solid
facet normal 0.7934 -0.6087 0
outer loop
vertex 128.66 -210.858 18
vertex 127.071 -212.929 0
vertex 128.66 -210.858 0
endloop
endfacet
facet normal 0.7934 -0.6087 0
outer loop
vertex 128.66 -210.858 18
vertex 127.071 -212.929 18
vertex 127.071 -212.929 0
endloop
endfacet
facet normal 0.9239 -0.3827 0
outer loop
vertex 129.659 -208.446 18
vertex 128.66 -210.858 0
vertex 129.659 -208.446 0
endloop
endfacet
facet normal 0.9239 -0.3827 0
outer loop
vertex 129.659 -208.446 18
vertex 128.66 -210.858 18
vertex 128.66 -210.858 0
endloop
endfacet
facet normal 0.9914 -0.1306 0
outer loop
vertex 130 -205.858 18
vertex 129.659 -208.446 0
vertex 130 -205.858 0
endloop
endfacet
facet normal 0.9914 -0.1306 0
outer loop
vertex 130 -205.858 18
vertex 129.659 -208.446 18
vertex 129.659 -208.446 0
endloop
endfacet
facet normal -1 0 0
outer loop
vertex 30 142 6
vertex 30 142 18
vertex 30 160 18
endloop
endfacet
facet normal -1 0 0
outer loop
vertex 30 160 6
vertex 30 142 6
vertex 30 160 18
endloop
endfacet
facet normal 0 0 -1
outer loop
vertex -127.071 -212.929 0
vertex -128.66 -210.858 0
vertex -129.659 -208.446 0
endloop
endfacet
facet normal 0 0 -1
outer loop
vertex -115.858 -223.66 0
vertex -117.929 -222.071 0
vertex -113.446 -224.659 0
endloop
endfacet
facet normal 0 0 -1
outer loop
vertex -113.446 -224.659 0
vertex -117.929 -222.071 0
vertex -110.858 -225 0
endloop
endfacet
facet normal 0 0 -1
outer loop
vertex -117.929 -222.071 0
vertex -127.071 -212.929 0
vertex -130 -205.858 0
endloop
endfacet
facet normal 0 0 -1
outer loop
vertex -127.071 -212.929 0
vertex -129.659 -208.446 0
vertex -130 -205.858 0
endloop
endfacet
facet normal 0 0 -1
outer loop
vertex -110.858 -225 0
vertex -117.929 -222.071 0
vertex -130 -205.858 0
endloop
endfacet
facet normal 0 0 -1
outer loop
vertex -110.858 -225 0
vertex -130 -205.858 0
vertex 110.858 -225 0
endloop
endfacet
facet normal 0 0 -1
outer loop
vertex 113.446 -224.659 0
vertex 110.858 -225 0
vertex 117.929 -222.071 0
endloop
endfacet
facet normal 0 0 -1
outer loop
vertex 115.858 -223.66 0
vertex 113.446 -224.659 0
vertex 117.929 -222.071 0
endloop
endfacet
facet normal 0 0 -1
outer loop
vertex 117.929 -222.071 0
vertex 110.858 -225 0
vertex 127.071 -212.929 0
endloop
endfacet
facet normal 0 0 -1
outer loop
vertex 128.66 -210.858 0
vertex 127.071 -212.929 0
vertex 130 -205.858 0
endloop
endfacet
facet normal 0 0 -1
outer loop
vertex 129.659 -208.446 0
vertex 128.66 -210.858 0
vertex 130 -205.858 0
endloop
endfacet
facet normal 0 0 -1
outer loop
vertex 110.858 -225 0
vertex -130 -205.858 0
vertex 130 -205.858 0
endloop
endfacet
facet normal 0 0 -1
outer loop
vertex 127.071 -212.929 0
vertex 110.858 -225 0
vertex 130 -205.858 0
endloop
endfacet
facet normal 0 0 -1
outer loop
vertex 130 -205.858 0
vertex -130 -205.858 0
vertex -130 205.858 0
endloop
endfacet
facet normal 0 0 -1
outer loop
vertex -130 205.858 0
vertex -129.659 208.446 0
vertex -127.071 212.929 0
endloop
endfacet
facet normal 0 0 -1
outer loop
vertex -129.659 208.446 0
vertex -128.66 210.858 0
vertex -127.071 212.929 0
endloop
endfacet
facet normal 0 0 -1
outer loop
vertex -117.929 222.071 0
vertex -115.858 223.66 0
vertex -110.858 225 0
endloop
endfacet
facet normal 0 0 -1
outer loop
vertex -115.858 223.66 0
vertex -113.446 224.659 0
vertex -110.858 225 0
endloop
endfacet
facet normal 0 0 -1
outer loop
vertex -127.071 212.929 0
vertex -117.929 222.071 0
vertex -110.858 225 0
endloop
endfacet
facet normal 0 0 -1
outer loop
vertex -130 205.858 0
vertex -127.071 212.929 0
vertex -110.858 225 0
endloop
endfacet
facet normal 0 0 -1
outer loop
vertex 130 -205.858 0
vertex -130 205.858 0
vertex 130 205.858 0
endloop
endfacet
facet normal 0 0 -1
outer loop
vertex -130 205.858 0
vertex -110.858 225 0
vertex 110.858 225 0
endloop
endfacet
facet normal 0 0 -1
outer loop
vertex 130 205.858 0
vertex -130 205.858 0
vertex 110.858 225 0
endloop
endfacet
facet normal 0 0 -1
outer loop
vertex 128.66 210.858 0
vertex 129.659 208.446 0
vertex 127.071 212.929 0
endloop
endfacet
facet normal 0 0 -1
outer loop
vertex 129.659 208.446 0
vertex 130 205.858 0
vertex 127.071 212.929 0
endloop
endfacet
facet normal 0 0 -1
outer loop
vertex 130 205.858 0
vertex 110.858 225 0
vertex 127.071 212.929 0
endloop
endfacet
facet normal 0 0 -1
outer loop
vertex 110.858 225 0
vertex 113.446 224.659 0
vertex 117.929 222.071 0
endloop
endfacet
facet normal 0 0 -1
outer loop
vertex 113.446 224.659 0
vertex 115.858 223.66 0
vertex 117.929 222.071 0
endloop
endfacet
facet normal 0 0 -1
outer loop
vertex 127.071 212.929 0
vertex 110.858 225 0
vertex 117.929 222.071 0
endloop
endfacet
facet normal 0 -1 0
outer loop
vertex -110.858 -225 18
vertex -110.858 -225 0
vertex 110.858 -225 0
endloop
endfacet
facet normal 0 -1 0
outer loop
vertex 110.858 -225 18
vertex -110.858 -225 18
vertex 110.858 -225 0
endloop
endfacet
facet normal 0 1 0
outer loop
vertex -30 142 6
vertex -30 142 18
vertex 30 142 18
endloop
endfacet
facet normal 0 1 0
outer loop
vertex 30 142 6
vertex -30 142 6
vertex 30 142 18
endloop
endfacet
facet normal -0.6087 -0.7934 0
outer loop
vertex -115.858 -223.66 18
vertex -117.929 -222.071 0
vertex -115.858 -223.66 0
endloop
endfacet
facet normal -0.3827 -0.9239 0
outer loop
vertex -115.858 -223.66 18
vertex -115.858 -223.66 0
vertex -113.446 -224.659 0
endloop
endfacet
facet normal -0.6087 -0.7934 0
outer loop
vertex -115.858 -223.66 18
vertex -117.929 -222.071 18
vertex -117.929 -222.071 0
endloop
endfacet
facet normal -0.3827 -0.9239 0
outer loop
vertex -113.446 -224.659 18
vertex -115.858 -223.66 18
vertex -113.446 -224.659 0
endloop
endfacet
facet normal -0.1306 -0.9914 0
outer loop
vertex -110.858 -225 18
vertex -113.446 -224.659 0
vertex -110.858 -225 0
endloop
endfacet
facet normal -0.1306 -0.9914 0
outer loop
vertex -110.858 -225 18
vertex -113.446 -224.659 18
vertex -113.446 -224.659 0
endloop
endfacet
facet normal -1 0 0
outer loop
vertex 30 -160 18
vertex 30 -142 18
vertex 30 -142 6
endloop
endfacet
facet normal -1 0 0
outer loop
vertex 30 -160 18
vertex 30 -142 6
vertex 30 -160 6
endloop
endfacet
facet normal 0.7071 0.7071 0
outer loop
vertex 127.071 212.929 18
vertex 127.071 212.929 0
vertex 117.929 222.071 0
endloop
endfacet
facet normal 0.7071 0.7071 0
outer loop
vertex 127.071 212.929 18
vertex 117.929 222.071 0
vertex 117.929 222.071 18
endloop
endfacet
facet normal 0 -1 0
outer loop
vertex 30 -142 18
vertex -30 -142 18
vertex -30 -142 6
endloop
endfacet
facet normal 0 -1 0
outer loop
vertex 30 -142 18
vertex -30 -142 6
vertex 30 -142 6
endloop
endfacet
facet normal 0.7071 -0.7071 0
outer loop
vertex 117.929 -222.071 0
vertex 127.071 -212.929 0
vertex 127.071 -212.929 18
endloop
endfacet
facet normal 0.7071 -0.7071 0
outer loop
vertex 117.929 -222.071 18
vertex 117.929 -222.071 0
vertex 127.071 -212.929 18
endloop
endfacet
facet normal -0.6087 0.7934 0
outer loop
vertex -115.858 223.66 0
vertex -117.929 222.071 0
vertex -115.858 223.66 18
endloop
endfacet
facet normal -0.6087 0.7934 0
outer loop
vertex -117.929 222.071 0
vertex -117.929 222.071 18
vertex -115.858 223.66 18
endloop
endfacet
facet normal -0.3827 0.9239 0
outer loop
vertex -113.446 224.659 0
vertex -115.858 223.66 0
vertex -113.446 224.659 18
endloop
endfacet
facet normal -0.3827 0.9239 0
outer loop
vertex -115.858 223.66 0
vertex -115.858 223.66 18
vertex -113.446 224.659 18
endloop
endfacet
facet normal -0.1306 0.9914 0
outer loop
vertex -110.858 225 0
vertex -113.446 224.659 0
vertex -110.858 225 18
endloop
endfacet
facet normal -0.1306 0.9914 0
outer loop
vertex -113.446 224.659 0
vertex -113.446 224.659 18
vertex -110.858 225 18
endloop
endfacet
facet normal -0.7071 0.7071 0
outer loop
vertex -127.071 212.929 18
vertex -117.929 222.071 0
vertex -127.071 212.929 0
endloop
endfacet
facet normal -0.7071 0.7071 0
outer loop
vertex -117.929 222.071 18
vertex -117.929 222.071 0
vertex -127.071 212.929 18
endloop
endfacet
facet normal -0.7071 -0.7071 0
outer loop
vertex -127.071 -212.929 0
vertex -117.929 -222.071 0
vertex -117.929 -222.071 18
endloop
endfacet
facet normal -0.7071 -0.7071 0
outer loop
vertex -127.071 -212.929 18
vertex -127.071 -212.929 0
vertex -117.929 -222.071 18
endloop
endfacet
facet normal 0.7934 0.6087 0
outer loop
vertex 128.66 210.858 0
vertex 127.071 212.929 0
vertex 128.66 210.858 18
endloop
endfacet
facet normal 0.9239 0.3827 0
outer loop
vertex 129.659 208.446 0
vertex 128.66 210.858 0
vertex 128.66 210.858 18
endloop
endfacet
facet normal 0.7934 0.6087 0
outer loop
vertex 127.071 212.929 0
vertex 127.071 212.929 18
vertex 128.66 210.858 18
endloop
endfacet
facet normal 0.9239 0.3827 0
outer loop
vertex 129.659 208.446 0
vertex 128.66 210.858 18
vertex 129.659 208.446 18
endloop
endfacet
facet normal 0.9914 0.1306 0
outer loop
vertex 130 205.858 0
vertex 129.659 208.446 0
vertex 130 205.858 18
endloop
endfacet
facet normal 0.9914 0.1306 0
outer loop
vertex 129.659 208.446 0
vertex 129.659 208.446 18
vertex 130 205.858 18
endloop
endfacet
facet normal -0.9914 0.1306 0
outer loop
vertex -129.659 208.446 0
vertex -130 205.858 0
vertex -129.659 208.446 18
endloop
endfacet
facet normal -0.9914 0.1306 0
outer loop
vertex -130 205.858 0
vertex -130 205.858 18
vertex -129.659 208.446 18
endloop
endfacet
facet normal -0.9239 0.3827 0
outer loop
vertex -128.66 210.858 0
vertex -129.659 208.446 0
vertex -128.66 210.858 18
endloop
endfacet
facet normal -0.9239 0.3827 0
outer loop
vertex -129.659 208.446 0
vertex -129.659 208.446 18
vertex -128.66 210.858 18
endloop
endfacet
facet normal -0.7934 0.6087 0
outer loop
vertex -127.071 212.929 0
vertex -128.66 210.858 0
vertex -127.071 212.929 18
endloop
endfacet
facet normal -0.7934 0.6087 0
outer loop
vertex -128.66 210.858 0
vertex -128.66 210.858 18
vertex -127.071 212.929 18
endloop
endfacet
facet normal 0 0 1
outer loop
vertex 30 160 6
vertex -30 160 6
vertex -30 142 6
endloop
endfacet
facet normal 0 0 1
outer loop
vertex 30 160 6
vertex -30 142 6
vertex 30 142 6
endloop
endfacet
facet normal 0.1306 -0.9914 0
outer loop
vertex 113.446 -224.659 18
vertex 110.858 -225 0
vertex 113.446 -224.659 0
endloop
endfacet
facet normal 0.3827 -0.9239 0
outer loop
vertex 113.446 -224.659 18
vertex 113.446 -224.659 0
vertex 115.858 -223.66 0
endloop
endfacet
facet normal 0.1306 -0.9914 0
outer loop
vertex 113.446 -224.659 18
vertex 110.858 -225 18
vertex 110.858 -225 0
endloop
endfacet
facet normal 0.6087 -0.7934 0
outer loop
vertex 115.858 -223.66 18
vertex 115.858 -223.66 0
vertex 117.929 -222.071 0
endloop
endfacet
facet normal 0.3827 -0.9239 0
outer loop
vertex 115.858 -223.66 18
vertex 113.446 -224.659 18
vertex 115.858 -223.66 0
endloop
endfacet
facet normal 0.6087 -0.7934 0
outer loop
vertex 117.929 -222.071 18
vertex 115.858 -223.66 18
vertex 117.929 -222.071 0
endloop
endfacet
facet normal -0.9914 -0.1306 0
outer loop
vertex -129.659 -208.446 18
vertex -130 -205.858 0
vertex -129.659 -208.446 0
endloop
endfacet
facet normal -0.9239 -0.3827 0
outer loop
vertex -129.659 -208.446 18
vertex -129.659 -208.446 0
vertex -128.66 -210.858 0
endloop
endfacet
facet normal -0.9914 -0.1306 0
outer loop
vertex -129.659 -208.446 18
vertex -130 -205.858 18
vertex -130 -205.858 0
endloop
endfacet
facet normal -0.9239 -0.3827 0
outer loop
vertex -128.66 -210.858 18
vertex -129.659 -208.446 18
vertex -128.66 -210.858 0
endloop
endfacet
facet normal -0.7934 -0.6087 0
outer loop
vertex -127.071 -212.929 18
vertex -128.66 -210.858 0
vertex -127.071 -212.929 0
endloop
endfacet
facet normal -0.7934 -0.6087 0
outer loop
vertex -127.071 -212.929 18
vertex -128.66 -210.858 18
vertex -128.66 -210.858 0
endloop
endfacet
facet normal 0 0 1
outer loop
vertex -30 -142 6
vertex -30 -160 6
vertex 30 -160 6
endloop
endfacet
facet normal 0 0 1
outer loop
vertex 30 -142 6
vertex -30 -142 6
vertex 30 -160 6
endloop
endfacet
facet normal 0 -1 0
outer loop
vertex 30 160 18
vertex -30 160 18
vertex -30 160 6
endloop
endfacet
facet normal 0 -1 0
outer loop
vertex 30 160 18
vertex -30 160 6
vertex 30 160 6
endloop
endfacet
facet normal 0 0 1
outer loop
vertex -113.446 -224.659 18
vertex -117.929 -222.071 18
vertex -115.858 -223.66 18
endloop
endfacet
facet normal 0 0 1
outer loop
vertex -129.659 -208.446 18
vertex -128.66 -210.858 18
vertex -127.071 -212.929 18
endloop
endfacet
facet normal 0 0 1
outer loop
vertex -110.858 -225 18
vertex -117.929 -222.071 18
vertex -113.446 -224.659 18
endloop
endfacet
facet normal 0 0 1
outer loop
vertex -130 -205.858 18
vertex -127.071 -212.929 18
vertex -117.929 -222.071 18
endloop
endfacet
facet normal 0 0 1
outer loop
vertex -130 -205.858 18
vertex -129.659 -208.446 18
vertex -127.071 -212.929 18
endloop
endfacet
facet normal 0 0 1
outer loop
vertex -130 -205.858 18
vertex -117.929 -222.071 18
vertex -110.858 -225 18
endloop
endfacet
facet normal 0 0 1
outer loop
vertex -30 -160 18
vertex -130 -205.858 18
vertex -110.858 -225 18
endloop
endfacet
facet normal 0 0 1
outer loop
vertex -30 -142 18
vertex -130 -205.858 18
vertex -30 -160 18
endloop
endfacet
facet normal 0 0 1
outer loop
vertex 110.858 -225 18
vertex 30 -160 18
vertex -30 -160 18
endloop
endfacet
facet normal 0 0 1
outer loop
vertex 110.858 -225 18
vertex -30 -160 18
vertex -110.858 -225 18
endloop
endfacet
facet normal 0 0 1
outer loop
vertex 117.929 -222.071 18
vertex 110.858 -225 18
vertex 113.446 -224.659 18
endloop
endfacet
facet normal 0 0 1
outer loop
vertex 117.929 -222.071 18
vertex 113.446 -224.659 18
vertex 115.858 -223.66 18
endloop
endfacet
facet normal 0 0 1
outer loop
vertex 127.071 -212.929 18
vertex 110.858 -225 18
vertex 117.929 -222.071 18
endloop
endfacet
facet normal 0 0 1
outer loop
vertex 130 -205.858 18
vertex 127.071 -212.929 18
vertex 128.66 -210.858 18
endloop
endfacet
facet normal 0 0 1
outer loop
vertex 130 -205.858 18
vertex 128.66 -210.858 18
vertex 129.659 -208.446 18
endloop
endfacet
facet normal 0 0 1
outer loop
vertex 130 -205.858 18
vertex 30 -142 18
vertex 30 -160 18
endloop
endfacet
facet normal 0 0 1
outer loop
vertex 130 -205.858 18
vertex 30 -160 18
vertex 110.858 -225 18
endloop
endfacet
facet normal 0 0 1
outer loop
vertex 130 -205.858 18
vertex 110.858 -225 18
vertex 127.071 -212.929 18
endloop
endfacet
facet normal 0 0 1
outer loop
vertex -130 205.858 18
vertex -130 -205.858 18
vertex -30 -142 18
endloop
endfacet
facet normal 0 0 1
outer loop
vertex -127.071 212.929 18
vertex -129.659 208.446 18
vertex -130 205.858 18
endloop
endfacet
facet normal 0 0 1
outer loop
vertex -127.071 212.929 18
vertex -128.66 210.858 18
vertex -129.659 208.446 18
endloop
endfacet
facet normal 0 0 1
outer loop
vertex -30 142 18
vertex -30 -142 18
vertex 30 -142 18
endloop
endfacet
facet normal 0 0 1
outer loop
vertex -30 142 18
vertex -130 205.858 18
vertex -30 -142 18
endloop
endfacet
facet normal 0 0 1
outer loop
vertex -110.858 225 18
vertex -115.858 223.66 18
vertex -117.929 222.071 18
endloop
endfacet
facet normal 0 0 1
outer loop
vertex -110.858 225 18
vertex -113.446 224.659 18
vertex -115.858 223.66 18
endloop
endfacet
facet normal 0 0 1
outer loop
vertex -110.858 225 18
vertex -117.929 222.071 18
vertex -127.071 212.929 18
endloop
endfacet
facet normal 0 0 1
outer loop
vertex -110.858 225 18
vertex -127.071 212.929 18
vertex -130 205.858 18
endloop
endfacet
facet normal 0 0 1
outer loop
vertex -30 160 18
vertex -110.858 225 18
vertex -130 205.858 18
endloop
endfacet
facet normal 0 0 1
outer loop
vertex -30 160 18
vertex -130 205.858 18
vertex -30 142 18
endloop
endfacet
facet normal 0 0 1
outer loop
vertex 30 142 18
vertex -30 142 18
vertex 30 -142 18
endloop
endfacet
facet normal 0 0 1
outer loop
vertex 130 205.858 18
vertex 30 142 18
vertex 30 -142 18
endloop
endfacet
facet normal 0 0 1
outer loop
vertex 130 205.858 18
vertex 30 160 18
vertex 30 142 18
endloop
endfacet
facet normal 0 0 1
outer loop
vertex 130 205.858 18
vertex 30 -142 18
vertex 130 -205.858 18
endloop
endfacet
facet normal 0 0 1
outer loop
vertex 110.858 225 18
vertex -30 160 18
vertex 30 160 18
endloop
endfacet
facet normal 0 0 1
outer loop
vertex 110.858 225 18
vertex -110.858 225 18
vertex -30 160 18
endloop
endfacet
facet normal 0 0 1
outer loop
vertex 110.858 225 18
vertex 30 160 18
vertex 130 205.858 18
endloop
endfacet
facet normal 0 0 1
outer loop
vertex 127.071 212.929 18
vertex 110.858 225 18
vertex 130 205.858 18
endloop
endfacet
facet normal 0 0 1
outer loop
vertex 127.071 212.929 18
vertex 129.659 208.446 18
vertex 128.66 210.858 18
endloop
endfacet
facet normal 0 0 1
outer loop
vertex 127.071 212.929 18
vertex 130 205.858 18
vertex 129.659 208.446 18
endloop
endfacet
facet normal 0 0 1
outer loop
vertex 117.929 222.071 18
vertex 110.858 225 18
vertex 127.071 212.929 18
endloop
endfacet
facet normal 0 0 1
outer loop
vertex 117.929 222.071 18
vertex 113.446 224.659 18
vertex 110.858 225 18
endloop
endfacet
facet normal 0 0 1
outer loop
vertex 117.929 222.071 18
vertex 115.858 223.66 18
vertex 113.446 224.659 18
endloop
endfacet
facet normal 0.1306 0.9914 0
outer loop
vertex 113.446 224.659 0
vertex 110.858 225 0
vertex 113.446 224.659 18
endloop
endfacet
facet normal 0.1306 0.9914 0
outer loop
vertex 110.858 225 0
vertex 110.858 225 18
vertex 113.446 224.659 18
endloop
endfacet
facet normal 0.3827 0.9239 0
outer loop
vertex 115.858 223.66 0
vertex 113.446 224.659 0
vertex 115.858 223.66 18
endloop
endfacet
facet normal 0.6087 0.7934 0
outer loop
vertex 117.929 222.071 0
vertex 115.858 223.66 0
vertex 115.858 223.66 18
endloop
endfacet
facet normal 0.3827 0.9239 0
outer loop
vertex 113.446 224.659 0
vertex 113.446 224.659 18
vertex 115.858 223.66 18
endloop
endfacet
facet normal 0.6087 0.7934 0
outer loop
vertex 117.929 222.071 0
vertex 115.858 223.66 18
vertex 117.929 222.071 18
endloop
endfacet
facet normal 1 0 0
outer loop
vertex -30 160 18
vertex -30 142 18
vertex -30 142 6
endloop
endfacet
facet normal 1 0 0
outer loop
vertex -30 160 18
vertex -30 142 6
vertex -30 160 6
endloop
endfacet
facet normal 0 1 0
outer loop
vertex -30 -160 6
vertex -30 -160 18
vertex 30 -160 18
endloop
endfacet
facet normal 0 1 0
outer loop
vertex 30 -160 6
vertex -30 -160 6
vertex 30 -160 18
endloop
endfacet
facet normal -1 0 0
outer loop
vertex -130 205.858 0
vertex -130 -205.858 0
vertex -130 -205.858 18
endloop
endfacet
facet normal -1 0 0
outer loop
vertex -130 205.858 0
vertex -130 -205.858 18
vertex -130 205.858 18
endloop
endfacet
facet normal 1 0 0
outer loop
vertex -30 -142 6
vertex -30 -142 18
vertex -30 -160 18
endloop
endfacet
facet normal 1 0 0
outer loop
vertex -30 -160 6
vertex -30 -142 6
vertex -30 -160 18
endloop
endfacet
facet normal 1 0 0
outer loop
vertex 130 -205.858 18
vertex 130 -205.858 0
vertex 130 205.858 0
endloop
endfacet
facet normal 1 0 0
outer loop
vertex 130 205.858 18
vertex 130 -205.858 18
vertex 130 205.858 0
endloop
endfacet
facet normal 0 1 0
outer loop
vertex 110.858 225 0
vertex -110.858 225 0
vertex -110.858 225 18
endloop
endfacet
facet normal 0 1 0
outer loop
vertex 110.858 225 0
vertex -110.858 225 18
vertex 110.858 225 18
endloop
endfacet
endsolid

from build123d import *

# Parameters (mm, degrees)
SKETCH_W     = 260
SKETCH_H     = 450
PAD_DEPTH    = 18
SKETCH001_W  = 60
SKETCH001_H  = 18
POCKET_DEPTH = 12
CHAMFER_SIZE = 15
FILLET_R     = 10


with BuildPart() as part:
    # Sketch → Pad (new body)
    with BuildSketch(Plane.XY):
        Rectangle(SKETCH_W, SKETCH_H)
    extrude(amount=PAD_DEPTH)

    # Sketch001 → Pocket (cut)
    with BuildSketch(Plane.XY.offset(18)):
        with Locations((0, 151)):
            Rectangle(SKETCH001_W, SKETCH001_H)
    pocket = extrude(amount=-POCKET_DEPTH, mode=Mode.SUBTRACT)

    # Mirrored: Pocket across Sketch001 H_Axis
    add(pocket.mirror(Plane(origin=(0, 0, 18), x_dir=(0, 0, 1), z_dir=(0, 1, 0))), mode=Mode.SUBTRACT)

    # Chamfer
    chamfer_edges = [part.edges().sort_by_distance(p)[0] for p in [
        (-130, -225, 9),
        (-130, 225, 9),
        (130, 225, 9),
        (130, -225, 9),
    ]]
    chamfer(chamfer_edges, length=CHAMFER_SIZE)

    # Fillet
    fillet_edges = [part.edges().sort_by_distance(p)[0] for p in [
        (115, -225, 9),
        (130, -210, 9),
        (-115, -225, 9),
        (-130, -210, 9),
        (-130, 210, 9),
        (-115, 225, 9),
        (115, 225, 9),
        (130, 210, 9),
    ]]
    fillet(fillet_edges, radius=FILLET_R)


solid = part.part
